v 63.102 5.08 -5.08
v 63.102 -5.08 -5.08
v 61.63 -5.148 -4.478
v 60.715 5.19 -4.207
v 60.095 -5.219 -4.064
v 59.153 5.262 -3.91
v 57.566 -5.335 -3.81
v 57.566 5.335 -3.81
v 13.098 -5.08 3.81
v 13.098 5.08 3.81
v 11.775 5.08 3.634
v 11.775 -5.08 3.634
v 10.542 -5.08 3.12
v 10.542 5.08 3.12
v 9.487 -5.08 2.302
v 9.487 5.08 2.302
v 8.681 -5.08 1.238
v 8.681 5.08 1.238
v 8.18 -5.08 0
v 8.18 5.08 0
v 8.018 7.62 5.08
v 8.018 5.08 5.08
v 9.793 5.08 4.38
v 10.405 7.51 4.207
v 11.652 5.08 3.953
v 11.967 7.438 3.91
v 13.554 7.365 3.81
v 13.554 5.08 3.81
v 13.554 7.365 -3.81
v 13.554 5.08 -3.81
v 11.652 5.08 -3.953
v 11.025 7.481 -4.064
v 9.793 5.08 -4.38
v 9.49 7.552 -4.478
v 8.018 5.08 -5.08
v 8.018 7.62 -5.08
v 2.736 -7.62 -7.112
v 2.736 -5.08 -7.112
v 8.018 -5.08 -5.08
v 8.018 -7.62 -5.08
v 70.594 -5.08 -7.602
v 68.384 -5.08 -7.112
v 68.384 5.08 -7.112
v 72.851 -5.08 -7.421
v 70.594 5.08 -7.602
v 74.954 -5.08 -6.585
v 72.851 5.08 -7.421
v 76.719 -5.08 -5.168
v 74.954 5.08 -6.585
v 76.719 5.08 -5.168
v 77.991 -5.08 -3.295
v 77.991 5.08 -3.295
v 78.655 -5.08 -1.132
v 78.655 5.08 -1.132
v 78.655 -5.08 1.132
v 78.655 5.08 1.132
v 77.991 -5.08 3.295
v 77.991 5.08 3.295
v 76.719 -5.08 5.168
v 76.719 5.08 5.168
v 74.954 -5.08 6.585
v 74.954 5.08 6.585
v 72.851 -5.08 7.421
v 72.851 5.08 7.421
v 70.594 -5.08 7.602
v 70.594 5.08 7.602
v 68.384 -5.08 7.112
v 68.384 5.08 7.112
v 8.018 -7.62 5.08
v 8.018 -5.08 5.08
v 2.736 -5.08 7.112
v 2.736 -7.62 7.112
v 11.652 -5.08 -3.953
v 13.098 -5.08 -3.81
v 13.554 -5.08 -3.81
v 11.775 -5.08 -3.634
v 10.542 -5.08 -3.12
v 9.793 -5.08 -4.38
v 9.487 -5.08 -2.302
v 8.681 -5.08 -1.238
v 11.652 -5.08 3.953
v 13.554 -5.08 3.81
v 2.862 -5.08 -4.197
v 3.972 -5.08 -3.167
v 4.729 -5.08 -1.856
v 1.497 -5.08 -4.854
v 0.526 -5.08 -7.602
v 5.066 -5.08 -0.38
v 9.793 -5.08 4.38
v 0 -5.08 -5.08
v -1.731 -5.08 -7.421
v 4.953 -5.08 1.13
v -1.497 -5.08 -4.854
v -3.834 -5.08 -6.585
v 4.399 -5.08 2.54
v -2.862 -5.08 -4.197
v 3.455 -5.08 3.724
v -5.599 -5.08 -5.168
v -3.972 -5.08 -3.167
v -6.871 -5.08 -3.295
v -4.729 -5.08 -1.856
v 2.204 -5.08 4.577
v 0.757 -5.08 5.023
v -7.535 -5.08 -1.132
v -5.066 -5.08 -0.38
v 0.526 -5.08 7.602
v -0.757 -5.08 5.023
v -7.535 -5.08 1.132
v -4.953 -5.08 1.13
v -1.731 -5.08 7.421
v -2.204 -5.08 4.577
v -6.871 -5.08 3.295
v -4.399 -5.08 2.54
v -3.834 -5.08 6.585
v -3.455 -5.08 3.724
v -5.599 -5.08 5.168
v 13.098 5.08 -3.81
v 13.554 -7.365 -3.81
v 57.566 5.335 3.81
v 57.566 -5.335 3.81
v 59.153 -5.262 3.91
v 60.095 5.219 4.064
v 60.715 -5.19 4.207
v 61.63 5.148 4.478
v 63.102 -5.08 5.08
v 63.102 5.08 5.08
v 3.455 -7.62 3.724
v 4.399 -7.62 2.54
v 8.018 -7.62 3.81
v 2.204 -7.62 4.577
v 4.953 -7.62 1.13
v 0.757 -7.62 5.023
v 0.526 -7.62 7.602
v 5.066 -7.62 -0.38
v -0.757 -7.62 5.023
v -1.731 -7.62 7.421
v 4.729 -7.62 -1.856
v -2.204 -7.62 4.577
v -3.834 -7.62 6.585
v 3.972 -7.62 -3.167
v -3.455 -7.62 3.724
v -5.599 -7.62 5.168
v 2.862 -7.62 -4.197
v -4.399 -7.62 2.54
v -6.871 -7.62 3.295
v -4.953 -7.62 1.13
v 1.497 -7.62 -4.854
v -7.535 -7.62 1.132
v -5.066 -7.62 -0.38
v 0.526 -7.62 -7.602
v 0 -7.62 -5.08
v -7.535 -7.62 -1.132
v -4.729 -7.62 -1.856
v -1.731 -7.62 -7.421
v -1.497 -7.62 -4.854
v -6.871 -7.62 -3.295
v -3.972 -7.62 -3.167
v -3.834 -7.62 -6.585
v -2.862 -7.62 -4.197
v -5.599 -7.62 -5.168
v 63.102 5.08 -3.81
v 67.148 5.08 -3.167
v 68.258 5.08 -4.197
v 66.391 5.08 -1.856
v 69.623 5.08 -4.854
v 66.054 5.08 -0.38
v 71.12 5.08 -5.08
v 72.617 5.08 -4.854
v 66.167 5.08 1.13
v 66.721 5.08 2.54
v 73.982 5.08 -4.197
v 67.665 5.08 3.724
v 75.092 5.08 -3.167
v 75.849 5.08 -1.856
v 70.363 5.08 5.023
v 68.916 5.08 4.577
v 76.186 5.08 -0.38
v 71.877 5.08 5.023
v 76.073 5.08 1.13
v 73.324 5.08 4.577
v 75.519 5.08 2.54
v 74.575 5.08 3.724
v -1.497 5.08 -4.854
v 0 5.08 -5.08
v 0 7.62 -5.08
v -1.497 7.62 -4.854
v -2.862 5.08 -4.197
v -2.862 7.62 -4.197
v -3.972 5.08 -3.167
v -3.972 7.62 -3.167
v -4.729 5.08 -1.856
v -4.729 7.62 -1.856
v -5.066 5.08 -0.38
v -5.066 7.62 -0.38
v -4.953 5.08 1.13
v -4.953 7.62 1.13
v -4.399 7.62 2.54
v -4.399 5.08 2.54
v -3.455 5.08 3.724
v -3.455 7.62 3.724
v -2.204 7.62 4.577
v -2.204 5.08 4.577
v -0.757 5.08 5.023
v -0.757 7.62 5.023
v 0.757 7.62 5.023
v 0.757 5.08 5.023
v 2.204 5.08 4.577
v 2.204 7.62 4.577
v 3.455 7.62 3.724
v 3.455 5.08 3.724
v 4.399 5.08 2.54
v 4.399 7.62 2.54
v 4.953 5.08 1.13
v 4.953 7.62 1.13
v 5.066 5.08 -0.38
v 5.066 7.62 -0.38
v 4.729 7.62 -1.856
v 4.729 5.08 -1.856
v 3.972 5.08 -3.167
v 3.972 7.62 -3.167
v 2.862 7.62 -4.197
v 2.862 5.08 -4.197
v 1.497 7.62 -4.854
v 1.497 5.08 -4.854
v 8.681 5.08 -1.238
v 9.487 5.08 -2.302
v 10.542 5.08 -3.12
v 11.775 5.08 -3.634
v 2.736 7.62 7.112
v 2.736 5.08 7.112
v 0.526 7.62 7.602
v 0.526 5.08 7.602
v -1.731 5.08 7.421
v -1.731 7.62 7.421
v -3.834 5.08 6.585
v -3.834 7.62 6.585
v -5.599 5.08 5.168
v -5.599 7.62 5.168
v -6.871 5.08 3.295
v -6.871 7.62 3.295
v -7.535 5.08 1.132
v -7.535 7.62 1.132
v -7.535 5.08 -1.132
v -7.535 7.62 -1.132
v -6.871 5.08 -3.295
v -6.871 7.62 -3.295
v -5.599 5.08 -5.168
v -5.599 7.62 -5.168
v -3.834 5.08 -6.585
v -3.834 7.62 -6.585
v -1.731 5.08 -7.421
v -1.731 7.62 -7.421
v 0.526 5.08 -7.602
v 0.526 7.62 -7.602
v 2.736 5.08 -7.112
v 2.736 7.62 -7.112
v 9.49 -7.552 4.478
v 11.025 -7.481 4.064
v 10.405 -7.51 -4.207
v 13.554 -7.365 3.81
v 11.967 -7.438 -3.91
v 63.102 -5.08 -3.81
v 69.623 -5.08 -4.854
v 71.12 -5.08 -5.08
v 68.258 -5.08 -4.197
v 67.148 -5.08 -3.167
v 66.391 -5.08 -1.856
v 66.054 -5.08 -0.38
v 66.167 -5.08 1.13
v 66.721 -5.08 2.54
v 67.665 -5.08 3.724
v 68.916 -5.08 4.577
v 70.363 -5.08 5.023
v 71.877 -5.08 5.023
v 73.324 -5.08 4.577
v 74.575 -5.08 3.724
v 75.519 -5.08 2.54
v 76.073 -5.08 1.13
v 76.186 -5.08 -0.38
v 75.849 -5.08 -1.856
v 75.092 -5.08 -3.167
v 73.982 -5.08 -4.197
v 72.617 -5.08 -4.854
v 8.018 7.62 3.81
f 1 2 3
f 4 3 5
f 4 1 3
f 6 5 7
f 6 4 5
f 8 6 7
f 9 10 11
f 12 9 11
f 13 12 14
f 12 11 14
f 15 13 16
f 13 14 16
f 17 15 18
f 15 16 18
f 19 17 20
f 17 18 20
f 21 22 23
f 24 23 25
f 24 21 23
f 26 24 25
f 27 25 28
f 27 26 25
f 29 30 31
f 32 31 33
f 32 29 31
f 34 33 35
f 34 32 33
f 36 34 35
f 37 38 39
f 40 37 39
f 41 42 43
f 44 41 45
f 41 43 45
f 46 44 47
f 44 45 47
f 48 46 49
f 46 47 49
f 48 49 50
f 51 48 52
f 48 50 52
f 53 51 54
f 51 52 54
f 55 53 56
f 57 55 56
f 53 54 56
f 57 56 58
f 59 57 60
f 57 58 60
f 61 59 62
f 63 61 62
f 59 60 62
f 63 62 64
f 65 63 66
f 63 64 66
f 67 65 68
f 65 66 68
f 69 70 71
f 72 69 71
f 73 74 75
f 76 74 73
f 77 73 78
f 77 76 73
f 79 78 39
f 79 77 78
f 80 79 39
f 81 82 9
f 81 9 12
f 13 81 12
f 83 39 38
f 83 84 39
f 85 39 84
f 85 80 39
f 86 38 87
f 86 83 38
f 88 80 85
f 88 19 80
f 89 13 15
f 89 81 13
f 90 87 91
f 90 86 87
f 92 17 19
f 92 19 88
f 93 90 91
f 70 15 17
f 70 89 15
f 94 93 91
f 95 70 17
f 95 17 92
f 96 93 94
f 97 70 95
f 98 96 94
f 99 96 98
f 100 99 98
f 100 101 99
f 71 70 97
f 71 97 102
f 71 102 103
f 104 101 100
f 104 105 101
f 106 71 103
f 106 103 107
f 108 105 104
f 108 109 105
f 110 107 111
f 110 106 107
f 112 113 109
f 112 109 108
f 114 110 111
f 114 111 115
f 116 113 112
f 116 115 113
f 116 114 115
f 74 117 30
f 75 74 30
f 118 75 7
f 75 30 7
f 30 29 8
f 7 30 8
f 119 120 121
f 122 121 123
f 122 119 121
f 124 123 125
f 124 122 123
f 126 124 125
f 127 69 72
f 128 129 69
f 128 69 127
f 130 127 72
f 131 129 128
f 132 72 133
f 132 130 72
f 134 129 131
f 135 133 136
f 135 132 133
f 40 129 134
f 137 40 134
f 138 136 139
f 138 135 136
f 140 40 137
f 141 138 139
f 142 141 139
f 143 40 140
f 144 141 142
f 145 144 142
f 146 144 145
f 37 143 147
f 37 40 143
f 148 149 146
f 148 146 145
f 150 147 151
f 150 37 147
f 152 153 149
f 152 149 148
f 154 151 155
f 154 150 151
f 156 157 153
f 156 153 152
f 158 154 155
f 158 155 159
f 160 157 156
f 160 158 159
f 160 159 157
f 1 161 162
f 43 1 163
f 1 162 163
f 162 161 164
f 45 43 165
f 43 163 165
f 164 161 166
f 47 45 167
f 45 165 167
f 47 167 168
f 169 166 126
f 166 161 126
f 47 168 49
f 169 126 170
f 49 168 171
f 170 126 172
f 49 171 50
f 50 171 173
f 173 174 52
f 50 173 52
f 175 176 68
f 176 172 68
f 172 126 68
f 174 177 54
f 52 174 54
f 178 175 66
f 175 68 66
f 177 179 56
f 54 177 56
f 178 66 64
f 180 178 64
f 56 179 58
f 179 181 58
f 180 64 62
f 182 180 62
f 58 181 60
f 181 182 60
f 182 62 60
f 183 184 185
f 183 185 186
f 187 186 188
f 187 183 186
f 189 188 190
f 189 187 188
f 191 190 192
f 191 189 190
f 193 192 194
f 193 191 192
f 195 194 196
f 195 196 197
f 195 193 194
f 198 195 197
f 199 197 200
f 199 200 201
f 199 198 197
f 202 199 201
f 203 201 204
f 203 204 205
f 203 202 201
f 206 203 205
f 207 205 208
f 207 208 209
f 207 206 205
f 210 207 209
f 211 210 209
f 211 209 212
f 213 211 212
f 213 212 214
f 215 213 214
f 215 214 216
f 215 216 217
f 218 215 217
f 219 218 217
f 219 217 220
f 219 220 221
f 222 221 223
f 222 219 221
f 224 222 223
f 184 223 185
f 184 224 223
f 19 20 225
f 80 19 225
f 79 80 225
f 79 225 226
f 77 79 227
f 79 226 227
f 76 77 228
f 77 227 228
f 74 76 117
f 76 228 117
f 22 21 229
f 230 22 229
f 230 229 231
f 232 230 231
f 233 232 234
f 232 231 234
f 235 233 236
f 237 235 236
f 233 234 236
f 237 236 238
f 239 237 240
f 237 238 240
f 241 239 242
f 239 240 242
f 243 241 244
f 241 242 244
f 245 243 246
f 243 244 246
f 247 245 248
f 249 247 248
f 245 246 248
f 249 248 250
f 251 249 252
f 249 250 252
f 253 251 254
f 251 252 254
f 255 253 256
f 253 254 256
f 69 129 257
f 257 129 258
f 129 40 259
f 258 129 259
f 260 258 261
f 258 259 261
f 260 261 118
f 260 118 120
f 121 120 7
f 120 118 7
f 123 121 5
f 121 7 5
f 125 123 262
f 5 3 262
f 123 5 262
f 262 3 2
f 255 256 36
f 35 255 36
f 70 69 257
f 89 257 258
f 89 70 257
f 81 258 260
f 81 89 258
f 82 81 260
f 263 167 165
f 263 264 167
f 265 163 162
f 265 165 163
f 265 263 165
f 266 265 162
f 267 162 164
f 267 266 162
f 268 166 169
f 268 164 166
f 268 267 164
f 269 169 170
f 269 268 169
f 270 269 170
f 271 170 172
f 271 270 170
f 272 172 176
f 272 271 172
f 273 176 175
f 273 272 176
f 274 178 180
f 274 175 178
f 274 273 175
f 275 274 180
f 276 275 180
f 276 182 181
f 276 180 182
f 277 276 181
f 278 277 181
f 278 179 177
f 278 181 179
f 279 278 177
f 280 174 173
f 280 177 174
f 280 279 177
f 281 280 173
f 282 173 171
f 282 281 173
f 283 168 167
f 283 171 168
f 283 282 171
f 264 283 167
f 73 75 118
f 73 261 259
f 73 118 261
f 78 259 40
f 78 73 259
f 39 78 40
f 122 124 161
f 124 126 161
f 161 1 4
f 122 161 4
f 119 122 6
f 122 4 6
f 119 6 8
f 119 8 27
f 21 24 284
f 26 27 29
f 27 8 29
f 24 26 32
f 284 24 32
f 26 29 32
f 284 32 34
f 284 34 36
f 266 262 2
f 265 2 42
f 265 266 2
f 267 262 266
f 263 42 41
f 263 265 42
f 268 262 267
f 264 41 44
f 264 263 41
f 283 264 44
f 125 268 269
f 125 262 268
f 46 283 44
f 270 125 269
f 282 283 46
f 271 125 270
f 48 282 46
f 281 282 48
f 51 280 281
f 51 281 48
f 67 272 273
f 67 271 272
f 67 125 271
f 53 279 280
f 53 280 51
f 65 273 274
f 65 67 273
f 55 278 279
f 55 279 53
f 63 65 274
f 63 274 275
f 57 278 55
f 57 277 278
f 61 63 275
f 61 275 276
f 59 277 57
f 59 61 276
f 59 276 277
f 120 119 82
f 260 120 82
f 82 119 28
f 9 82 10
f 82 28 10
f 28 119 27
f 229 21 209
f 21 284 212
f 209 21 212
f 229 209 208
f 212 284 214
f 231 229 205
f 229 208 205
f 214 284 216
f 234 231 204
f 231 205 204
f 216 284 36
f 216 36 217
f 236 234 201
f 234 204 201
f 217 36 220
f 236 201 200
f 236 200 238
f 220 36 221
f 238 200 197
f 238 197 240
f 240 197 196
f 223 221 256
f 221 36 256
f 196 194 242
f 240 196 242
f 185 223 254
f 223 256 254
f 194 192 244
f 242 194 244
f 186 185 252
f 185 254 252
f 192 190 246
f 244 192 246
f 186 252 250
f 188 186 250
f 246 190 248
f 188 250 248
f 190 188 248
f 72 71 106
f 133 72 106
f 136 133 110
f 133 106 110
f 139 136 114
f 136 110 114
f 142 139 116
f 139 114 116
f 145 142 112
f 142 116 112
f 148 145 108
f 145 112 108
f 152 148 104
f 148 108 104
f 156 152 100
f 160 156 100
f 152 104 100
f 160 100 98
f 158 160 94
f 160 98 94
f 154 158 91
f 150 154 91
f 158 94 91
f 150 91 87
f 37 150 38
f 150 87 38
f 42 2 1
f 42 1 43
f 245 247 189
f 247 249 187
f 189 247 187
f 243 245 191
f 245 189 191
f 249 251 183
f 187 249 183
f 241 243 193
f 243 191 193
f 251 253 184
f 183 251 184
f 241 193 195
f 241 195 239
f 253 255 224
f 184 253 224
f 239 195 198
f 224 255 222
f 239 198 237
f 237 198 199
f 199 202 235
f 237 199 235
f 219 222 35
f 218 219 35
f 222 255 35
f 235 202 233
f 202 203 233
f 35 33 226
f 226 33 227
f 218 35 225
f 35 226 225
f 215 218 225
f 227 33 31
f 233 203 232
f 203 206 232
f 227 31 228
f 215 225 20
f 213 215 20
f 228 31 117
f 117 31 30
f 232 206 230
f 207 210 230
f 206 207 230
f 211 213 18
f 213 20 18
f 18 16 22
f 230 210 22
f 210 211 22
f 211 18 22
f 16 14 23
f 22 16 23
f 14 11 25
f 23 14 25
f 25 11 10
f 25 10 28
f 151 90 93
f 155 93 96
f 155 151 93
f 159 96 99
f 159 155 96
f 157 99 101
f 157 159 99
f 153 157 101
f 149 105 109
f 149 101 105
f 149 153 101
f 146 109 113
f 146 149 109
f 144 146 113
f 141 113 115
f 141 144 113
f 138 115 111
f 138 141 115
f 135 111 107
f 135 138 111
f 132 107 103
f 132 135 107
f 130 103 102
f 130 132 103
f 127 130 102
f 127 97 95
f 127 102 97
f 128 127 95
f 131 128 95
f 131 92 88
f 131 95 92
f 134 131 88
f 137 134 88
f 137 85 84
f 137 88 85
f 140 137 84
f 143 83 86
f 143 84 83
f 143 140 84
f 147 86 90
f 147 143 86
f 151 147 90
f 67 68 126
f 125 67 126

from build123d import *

# Parameters (mm, degrees)
SKETCH1_R           = 5.08
BOSS_EXTRUDE1_DEPTH = 7.62
SKETCH2_W           = 15.638324702
SKETCH2_H           = 10.16
CUT_EXTRUDE1_DEPTH  = 83.001098163
FILLET1_R           = 12.7
FILLET2_R           = 5.08


with BuildPart() as part:
    # Sketch1 → Boss-Extrude1 (new, symmetric)
    with BuildSketch(Plane(origin=(0, 0, 0), x_dir=(1, 0, 0), z_dir=(0, 1, 0))):
        with BuildLine():
            Line((2.735663722, 7.112), (8.018324702, 5.08))
            Line((8.018324702, 5.08), (8.018324702, 3.81))
            Line((8.018324702, 3.81), (63.101675298, 3.81))
            Line((63.101675298, 3.81), (63.101675298, 5.08))
            Line((63.101675298, 5.08), (68.384336278, 7.112))
            ThreePointArc((68.384336278, 7.112), (78.74, 0), (68.384336278, -7.112))
            Line((68.384336278, -7.112), (63.101675298, -5.08))
            Line((63.101675298, -5.08), (63.101675298, -3.81))
            Line((63.101675298, -3.81), (8.018324702, -3.81))
            Line((8.018324702, -3.81), (8.018324702, -5.08))
            Line((8.018324702, -5.08), (2.735663722, -7.112))
            ThreePointArc((2.735663722, -7.112), (-7.62, 0), (2.735663722, 7.112))
        make_face()
        with Locations(Location((0, 0, 0), (0, 0, 90))):
            Circle(SKETCH1_R, mode=Mode.SUBTRACT)
        with Locations(Location((71.12, 0, 0), (0, 0, 90))):
            Circle(SKETCH1_R, mode=Mode.SUBTRACT)
    extrude(amount=BOSS_EXTRUDE1_DEPTH, both=True)

    # Sketch2 → Cut-Extrude1 (cut, through all)
    with BuildSketch(Plane.XY.offset(13.97)):
        Polygon((8.018324702, 7.62), (63.101675298, 5.08), (78.74, 5.08), (78.74, 7.62), align=None)
        with Locations((0.199162351, 0)):
            Rectangle(SKETCH2_W, SKETCH2_H)
        Polygon((63.101675298, -5.08), (78.74, -5.08), (78.74, -7.62), (8.018324702, -7.62), align=None)
    extrude(amount=-CUT_EXTRUDE1_DEPTH, mode=Mode.SUBTRACT)

    # Fillet1
    # the kernel refuses this fillet: 12.7 mm, written as the material it adds along each edge
    with BuildSketch(Plane(origin=(63.101675298, 18.919504146, 3.81), x_dir=(-1, 0, 0), z_dir=(0, -1, 0))) as fillet1_piece_1_section:
        with BuildLine():
            CenterArc((5.535801658, -12.7), FILLET1_R, 90, 25.841932763)
            Line((0, -1.27), (0, 0))
            Line((0, 0), (5.535801658, 0))
        make_face()
    fillet1_piece_1 = extrude(amount=37.839008291, mode=Mode.PRIVATE)
    fillet1_piece_1 = split(fillet1_piece_1, bisect_by=Plane(origin=(59.36502655, 5.252304112, 3.912132652), z_dir=(-0.04606299102663346, -0.9989385370770718, 0)), keep=Keep.TOP, mode=Mode.PRIVATE)
    fillet1_piece_1 = split(fillet1_piece_1, bisect_by=Plane(origin=(59.844275634, -5.230205009, 3.912132652), z_dir=(-0.04606299102663346, 0.9989385370770718, 0)), keep=Keep.TOP, mode=Mode.PRIVATE)
    add(fillet1_piece_1)
    with BuildSketch(Plane(origin=(63.101675298, 18.919504146, -3.81), x_dir=(0, 0, -1), z_dir=(0, -1, 0))) as fillet1_piece_2_section:
        with BuildLine():
            CenterArc((12.7, -5.535801658), FILLET1_R, 154.158067237, 25.841932763)
            Line((0, -5.535801658), (0, 0))
            Line((0, 0), (1.27, 0))
        make_face()
    fillet1_piece_2 = extrude(amount=37.839008291, mode=Mode.PRIVATE)
    fillet1_piece_2 = split(fillet1_piece_2, bisect_by=Plane(origin=(62.135782482, 5.124539189, -4.63296), z_dir=(-0.04606299102663346, -0.9989385370770718, 0)), keep=Keep.TOP, mode=Mode.PRIVATE)
    fillet1_piece_2 = split(fillet1_piece_2, bisect_by=Plane(origin=(62.604689444, -5.10291698, -4.63296), z_dir=(-0.04606299102663346, 0.9989385370770718, 0)), keep=Keep.TOP, mode=Mode.PRIVATE)
    add(fillet1_piece_2)
    with BuildSketch(Plane(origin=(8.018324702, 8.759504146, -3.81), x_dir=(1, 0, 0), z_dir=(0, -1, 0))) as fillet1_piece_3_section:
        with BuildLine():
            CenterArc((5.535801658, -12.7), FILLET1_R, 90, 25.841932763)
            Line((0, -1.27), (0, 0))
            Line((0, 0), (5.535801658, 0))
        make_face()
    fillet1_piece_3 = extrude(amount=30.219008291, mode=Mode.PRIVATE)
    fillet1_piece_3 = split(fillet1_piece_3, bisect_by=Plane(origin=(11.809644031, 7.445174921, -3.912132652), z_dir=(-0.04606299102663346, -0.9989385370770718, 0)), keep=Keep.TOP, mode=Mode.PRIVATE)
    fillet1_piece_3 = split(fillet1_piece_3, bisect_by=Plane(origin=(11.757033309, 5.08, -3.912132652), z_dir=(0, 1, 0)), keep=Keep.TOP, mode=Mode.PRIVATE)
    add(fillet1_piece_3)
    with BuildSketch(Plane(origin=(8.018324702, -5.08, -3.81), x_dir=(1, 0, 0), z_dir=(0, -1, 0))) as fillet1_piece_4_section:
        with BuildLine():
            CenterArc((5.535801658, -12.7), FILLET1_R, 90, 25.841932763)
            Line((0, -1.27), (0, 0))
            Line((0, 0), (5.535801658, 0))
        make_face()
    fillet1_piece_4 = extrude(amount=16.379504146, mode=Mode.PRIVATE)
    fillet1_piece_4 = split(fillet1_piece_4, bisect_by=Plane(origin=(11.809644031, -7.445174921, -3.912132652), z_dir=(-0.04606299102663346, 0.9989385370770718, 0)), keep=Keep.TOP, mode=Mode.PRIVATE)
    add(fillet1_piece_4)
    with BuildSketch(Plane(origin=(8.018324702, 21.459504146, -3.81), x_dir=(1, 0, 0), z_dir=(0, -1, 0))) as fillet1_piece_5_section:
        with BuildLine():
            CenterArc((5.535801658, -12.7), FILLET1_R, 90, 25.841932763)
            Line((0, -1.27), (0, 0))
            Line((0, 0), (5.535801658, 0))
        make_face()
    fillet1_piece_5 = extrude(amount=16.379504146, mode=Mode.PRIVATE)
    fillet1_piece_5 = split(fillet1_piece_5, bisect_by=Plane(origin=(11.809644031, 7.445174921, -3.912132652), z_dir=(-0.04606299102663346, -0.9989385370770718, 0)), keep=Keep.TOP, mode=Mode.PRIVATE)
    add(fillet1_piece_5)
    with BuildSketch(Plane(origin=(8.018324702, 21.459504146, -3.81), x_dir=(1, 0, 0), z_dir=(0, -1, 0))) as fillet1_piece_6_section:
        with BuildLine():
            CenterArc((5.535801658, -12.7), FILLET1_R, 90, 25.841932763)
            Line((0, -1.27), (0, 0))
            Line((0, 0), (5.535801658, 0))
        make_face()
    fillet1_piece_6 = extrude(amount=30.219008291, mode=Mode.PRIVATE)
    fillet1_piece_6 = split(fillet1_piece_6, bisect_by=Plane(origin=(11.757033309, -5.08, -3.912132652), z_dir=(0, -1, 0)), keep=Keep.TOP, mode=Mode.PRIVATE)
    fillet1_piece_6 = split(fillet1_piece_6, bisect_by=Plane(origin=(11.809644031, -7.445174921, -3.912132652), z_dir=(-0.04606299102663346, 0.9989385370770718, 0)), keep=Keep.TOP, mode=Mode.PRIVATE)
    add(fillet1_piece_6)
    with BuildSketch(Plane(origin=(8.018324702, 8.759504146, 3.81), x_dir=(1, 0, 0), z_dir=(0, -1, 0))) as fillet1_piece_7_section:
        with BuildLine():
            CenterArc((5.535801658, 12.7), FILLET1_R, 244.158067237, 25.841932763)
            Line((0, 1.27), (0, 0))
            Line((0, 0), (5.535801658, 0))
        make_face()
    fillet1_piece_7 = extrude(amount=30.219008291, mode=Mode.PRIVATE)
    fillet1_piece_7 = split(fillet1_piece_7, bisect_by=Plane(origin=(11.809644031, 7.445174921, 3.912132652), z_dir=(-0.04606299102663346, -0.9989385370770718, 0)), keep=Keep.TOP, mode=Mode.PRIVATE)
    fillet1_piece_7 = split(fillet1_piece_7, bisect_by=Plane(origin=(11.757033309, 5.08, 3.912132652), z_dir=(0, 1, 0)), keep=Keep.TOP, mode=Mode.PRIVATE)
    add(fillet1_piece_7)
    with BuildSketch(Plane(origin=(8.018324702, -5.08, 3.81), x_dir=(1, 0, 0), z_dir=(0, -1, 0))) as fillet1_piece_8_section:
        with BuildLine():
            CenterArc((5.535801658, 12.7), FILLET1_R, 244.158067237, 25.841932763)
            Line((0, 1.27), (0, 0))
            Line((0, 0), (5.535801658, 0))
        make_face()
    fillet1_piece_8 = extrude(amount=16.379504146, mode=Mode.PRIVATE)
    fillet1_piece_8 = split(fillet1_piece_8, bisect_by=Plane(origin=(11.809644031, -7.445174921, 3.912132652), z_dir=(-0.04606299102663346, 0.9989385370770718, 0)), keep=Keep.TOP, mode=Mode.PRIVATE)
    add(fillet1_piece_8)
    with BuildSketch(Plane(origin=(8.018324702, 21.459504146, 3.81), x_dir=(0, 0, 1), z_dir=(0, -1, 0))) as fillet1_piece_9_section:
        with BuildLine():
            CenterArc((12.7, -5.535801658), FILLET1_R, 154.158067237, 25.841932763)
            Line((0, -5.535801658), (0, 0))
            Line((0, 0), (1.27, 0))
        make_face()
    fillet1_piece_9 = extrude(amount=16.379504146, mode=Mode.PRIVATE)
    fillet1_piece_9 = split(fillet1_piece_9, bisect_by=Plane(origin=(9.041953552, 7.572798491, 4.63296), z_dir=(-0.04606299102663346, -0.9989385370770718, 0)), keep=Keep.TOP, mode=Mode.PRIVATE)
    add(fillet1_piece_9)
    with BuildSketch(Plane(origin=(8.018324702, 21.459504146, 3.81), x_dir=(0, 0, 1), z_dir=(0, -1, 0))) as fillet1_piece_10_section:
        with BuildLine():
            CenterArc((12.7, -5.535801658), FILLET1_R, 154.158067237, 25.841932763)
            Line((0, -5.535801658), (0, 0))
            Line((0, 0), (1.27, 0))
        make_face()
    fillet1_piece_10 = extrude(amount=30.219008291, mode=Mode.PRIVATE)
    fillet1_piece_10 = split(fillet1_piece_10, bisect_by=Plane(origin=(8.985567945, -5.08, 4.63296), z_dir=(0, -1, 0)), keep=Keep.TOP, mode=Mode.PRIVATE)
    fillet1_piece_10 = split(fillet1_piece_10, bisect_by=Plane(origin=(9.041953552, -7.572798491, 4.63296), z_dir=(-0.04606299102663346, 0.9989385370770718, 0)), keep=Keep.TOP, mode=Mode.PRIVATE)
    add(fillet1_piece_10)

    # Fillet2
    # the kernel refuses this fillet: 5.08 mm, written as the material it takes off along each edge
    with BuildSketch(Plane(origin=(8.018324702, 5.08, -3.81), x_dir=(1, 0, 0), z_dir=(0, -1, 0)), Plane(origin=(8.018324702, 5.08, 3.81), x_dir=(0, 0, -1), z_dir=(0, -1, 0))) as fillet2_piece_1:
        with BuildLine():
            CenterArc((FILLET2_R, FILLET2_R), FILLET2_R, 180, 90)
            Line((0, FILLET2_R), (0, 0))
            Line((0, 0), (FILLET2_R, 0))
        make_face()
    extrude(amount=10.16, mode=Mode.SUBTRACT)


solid = part.part
